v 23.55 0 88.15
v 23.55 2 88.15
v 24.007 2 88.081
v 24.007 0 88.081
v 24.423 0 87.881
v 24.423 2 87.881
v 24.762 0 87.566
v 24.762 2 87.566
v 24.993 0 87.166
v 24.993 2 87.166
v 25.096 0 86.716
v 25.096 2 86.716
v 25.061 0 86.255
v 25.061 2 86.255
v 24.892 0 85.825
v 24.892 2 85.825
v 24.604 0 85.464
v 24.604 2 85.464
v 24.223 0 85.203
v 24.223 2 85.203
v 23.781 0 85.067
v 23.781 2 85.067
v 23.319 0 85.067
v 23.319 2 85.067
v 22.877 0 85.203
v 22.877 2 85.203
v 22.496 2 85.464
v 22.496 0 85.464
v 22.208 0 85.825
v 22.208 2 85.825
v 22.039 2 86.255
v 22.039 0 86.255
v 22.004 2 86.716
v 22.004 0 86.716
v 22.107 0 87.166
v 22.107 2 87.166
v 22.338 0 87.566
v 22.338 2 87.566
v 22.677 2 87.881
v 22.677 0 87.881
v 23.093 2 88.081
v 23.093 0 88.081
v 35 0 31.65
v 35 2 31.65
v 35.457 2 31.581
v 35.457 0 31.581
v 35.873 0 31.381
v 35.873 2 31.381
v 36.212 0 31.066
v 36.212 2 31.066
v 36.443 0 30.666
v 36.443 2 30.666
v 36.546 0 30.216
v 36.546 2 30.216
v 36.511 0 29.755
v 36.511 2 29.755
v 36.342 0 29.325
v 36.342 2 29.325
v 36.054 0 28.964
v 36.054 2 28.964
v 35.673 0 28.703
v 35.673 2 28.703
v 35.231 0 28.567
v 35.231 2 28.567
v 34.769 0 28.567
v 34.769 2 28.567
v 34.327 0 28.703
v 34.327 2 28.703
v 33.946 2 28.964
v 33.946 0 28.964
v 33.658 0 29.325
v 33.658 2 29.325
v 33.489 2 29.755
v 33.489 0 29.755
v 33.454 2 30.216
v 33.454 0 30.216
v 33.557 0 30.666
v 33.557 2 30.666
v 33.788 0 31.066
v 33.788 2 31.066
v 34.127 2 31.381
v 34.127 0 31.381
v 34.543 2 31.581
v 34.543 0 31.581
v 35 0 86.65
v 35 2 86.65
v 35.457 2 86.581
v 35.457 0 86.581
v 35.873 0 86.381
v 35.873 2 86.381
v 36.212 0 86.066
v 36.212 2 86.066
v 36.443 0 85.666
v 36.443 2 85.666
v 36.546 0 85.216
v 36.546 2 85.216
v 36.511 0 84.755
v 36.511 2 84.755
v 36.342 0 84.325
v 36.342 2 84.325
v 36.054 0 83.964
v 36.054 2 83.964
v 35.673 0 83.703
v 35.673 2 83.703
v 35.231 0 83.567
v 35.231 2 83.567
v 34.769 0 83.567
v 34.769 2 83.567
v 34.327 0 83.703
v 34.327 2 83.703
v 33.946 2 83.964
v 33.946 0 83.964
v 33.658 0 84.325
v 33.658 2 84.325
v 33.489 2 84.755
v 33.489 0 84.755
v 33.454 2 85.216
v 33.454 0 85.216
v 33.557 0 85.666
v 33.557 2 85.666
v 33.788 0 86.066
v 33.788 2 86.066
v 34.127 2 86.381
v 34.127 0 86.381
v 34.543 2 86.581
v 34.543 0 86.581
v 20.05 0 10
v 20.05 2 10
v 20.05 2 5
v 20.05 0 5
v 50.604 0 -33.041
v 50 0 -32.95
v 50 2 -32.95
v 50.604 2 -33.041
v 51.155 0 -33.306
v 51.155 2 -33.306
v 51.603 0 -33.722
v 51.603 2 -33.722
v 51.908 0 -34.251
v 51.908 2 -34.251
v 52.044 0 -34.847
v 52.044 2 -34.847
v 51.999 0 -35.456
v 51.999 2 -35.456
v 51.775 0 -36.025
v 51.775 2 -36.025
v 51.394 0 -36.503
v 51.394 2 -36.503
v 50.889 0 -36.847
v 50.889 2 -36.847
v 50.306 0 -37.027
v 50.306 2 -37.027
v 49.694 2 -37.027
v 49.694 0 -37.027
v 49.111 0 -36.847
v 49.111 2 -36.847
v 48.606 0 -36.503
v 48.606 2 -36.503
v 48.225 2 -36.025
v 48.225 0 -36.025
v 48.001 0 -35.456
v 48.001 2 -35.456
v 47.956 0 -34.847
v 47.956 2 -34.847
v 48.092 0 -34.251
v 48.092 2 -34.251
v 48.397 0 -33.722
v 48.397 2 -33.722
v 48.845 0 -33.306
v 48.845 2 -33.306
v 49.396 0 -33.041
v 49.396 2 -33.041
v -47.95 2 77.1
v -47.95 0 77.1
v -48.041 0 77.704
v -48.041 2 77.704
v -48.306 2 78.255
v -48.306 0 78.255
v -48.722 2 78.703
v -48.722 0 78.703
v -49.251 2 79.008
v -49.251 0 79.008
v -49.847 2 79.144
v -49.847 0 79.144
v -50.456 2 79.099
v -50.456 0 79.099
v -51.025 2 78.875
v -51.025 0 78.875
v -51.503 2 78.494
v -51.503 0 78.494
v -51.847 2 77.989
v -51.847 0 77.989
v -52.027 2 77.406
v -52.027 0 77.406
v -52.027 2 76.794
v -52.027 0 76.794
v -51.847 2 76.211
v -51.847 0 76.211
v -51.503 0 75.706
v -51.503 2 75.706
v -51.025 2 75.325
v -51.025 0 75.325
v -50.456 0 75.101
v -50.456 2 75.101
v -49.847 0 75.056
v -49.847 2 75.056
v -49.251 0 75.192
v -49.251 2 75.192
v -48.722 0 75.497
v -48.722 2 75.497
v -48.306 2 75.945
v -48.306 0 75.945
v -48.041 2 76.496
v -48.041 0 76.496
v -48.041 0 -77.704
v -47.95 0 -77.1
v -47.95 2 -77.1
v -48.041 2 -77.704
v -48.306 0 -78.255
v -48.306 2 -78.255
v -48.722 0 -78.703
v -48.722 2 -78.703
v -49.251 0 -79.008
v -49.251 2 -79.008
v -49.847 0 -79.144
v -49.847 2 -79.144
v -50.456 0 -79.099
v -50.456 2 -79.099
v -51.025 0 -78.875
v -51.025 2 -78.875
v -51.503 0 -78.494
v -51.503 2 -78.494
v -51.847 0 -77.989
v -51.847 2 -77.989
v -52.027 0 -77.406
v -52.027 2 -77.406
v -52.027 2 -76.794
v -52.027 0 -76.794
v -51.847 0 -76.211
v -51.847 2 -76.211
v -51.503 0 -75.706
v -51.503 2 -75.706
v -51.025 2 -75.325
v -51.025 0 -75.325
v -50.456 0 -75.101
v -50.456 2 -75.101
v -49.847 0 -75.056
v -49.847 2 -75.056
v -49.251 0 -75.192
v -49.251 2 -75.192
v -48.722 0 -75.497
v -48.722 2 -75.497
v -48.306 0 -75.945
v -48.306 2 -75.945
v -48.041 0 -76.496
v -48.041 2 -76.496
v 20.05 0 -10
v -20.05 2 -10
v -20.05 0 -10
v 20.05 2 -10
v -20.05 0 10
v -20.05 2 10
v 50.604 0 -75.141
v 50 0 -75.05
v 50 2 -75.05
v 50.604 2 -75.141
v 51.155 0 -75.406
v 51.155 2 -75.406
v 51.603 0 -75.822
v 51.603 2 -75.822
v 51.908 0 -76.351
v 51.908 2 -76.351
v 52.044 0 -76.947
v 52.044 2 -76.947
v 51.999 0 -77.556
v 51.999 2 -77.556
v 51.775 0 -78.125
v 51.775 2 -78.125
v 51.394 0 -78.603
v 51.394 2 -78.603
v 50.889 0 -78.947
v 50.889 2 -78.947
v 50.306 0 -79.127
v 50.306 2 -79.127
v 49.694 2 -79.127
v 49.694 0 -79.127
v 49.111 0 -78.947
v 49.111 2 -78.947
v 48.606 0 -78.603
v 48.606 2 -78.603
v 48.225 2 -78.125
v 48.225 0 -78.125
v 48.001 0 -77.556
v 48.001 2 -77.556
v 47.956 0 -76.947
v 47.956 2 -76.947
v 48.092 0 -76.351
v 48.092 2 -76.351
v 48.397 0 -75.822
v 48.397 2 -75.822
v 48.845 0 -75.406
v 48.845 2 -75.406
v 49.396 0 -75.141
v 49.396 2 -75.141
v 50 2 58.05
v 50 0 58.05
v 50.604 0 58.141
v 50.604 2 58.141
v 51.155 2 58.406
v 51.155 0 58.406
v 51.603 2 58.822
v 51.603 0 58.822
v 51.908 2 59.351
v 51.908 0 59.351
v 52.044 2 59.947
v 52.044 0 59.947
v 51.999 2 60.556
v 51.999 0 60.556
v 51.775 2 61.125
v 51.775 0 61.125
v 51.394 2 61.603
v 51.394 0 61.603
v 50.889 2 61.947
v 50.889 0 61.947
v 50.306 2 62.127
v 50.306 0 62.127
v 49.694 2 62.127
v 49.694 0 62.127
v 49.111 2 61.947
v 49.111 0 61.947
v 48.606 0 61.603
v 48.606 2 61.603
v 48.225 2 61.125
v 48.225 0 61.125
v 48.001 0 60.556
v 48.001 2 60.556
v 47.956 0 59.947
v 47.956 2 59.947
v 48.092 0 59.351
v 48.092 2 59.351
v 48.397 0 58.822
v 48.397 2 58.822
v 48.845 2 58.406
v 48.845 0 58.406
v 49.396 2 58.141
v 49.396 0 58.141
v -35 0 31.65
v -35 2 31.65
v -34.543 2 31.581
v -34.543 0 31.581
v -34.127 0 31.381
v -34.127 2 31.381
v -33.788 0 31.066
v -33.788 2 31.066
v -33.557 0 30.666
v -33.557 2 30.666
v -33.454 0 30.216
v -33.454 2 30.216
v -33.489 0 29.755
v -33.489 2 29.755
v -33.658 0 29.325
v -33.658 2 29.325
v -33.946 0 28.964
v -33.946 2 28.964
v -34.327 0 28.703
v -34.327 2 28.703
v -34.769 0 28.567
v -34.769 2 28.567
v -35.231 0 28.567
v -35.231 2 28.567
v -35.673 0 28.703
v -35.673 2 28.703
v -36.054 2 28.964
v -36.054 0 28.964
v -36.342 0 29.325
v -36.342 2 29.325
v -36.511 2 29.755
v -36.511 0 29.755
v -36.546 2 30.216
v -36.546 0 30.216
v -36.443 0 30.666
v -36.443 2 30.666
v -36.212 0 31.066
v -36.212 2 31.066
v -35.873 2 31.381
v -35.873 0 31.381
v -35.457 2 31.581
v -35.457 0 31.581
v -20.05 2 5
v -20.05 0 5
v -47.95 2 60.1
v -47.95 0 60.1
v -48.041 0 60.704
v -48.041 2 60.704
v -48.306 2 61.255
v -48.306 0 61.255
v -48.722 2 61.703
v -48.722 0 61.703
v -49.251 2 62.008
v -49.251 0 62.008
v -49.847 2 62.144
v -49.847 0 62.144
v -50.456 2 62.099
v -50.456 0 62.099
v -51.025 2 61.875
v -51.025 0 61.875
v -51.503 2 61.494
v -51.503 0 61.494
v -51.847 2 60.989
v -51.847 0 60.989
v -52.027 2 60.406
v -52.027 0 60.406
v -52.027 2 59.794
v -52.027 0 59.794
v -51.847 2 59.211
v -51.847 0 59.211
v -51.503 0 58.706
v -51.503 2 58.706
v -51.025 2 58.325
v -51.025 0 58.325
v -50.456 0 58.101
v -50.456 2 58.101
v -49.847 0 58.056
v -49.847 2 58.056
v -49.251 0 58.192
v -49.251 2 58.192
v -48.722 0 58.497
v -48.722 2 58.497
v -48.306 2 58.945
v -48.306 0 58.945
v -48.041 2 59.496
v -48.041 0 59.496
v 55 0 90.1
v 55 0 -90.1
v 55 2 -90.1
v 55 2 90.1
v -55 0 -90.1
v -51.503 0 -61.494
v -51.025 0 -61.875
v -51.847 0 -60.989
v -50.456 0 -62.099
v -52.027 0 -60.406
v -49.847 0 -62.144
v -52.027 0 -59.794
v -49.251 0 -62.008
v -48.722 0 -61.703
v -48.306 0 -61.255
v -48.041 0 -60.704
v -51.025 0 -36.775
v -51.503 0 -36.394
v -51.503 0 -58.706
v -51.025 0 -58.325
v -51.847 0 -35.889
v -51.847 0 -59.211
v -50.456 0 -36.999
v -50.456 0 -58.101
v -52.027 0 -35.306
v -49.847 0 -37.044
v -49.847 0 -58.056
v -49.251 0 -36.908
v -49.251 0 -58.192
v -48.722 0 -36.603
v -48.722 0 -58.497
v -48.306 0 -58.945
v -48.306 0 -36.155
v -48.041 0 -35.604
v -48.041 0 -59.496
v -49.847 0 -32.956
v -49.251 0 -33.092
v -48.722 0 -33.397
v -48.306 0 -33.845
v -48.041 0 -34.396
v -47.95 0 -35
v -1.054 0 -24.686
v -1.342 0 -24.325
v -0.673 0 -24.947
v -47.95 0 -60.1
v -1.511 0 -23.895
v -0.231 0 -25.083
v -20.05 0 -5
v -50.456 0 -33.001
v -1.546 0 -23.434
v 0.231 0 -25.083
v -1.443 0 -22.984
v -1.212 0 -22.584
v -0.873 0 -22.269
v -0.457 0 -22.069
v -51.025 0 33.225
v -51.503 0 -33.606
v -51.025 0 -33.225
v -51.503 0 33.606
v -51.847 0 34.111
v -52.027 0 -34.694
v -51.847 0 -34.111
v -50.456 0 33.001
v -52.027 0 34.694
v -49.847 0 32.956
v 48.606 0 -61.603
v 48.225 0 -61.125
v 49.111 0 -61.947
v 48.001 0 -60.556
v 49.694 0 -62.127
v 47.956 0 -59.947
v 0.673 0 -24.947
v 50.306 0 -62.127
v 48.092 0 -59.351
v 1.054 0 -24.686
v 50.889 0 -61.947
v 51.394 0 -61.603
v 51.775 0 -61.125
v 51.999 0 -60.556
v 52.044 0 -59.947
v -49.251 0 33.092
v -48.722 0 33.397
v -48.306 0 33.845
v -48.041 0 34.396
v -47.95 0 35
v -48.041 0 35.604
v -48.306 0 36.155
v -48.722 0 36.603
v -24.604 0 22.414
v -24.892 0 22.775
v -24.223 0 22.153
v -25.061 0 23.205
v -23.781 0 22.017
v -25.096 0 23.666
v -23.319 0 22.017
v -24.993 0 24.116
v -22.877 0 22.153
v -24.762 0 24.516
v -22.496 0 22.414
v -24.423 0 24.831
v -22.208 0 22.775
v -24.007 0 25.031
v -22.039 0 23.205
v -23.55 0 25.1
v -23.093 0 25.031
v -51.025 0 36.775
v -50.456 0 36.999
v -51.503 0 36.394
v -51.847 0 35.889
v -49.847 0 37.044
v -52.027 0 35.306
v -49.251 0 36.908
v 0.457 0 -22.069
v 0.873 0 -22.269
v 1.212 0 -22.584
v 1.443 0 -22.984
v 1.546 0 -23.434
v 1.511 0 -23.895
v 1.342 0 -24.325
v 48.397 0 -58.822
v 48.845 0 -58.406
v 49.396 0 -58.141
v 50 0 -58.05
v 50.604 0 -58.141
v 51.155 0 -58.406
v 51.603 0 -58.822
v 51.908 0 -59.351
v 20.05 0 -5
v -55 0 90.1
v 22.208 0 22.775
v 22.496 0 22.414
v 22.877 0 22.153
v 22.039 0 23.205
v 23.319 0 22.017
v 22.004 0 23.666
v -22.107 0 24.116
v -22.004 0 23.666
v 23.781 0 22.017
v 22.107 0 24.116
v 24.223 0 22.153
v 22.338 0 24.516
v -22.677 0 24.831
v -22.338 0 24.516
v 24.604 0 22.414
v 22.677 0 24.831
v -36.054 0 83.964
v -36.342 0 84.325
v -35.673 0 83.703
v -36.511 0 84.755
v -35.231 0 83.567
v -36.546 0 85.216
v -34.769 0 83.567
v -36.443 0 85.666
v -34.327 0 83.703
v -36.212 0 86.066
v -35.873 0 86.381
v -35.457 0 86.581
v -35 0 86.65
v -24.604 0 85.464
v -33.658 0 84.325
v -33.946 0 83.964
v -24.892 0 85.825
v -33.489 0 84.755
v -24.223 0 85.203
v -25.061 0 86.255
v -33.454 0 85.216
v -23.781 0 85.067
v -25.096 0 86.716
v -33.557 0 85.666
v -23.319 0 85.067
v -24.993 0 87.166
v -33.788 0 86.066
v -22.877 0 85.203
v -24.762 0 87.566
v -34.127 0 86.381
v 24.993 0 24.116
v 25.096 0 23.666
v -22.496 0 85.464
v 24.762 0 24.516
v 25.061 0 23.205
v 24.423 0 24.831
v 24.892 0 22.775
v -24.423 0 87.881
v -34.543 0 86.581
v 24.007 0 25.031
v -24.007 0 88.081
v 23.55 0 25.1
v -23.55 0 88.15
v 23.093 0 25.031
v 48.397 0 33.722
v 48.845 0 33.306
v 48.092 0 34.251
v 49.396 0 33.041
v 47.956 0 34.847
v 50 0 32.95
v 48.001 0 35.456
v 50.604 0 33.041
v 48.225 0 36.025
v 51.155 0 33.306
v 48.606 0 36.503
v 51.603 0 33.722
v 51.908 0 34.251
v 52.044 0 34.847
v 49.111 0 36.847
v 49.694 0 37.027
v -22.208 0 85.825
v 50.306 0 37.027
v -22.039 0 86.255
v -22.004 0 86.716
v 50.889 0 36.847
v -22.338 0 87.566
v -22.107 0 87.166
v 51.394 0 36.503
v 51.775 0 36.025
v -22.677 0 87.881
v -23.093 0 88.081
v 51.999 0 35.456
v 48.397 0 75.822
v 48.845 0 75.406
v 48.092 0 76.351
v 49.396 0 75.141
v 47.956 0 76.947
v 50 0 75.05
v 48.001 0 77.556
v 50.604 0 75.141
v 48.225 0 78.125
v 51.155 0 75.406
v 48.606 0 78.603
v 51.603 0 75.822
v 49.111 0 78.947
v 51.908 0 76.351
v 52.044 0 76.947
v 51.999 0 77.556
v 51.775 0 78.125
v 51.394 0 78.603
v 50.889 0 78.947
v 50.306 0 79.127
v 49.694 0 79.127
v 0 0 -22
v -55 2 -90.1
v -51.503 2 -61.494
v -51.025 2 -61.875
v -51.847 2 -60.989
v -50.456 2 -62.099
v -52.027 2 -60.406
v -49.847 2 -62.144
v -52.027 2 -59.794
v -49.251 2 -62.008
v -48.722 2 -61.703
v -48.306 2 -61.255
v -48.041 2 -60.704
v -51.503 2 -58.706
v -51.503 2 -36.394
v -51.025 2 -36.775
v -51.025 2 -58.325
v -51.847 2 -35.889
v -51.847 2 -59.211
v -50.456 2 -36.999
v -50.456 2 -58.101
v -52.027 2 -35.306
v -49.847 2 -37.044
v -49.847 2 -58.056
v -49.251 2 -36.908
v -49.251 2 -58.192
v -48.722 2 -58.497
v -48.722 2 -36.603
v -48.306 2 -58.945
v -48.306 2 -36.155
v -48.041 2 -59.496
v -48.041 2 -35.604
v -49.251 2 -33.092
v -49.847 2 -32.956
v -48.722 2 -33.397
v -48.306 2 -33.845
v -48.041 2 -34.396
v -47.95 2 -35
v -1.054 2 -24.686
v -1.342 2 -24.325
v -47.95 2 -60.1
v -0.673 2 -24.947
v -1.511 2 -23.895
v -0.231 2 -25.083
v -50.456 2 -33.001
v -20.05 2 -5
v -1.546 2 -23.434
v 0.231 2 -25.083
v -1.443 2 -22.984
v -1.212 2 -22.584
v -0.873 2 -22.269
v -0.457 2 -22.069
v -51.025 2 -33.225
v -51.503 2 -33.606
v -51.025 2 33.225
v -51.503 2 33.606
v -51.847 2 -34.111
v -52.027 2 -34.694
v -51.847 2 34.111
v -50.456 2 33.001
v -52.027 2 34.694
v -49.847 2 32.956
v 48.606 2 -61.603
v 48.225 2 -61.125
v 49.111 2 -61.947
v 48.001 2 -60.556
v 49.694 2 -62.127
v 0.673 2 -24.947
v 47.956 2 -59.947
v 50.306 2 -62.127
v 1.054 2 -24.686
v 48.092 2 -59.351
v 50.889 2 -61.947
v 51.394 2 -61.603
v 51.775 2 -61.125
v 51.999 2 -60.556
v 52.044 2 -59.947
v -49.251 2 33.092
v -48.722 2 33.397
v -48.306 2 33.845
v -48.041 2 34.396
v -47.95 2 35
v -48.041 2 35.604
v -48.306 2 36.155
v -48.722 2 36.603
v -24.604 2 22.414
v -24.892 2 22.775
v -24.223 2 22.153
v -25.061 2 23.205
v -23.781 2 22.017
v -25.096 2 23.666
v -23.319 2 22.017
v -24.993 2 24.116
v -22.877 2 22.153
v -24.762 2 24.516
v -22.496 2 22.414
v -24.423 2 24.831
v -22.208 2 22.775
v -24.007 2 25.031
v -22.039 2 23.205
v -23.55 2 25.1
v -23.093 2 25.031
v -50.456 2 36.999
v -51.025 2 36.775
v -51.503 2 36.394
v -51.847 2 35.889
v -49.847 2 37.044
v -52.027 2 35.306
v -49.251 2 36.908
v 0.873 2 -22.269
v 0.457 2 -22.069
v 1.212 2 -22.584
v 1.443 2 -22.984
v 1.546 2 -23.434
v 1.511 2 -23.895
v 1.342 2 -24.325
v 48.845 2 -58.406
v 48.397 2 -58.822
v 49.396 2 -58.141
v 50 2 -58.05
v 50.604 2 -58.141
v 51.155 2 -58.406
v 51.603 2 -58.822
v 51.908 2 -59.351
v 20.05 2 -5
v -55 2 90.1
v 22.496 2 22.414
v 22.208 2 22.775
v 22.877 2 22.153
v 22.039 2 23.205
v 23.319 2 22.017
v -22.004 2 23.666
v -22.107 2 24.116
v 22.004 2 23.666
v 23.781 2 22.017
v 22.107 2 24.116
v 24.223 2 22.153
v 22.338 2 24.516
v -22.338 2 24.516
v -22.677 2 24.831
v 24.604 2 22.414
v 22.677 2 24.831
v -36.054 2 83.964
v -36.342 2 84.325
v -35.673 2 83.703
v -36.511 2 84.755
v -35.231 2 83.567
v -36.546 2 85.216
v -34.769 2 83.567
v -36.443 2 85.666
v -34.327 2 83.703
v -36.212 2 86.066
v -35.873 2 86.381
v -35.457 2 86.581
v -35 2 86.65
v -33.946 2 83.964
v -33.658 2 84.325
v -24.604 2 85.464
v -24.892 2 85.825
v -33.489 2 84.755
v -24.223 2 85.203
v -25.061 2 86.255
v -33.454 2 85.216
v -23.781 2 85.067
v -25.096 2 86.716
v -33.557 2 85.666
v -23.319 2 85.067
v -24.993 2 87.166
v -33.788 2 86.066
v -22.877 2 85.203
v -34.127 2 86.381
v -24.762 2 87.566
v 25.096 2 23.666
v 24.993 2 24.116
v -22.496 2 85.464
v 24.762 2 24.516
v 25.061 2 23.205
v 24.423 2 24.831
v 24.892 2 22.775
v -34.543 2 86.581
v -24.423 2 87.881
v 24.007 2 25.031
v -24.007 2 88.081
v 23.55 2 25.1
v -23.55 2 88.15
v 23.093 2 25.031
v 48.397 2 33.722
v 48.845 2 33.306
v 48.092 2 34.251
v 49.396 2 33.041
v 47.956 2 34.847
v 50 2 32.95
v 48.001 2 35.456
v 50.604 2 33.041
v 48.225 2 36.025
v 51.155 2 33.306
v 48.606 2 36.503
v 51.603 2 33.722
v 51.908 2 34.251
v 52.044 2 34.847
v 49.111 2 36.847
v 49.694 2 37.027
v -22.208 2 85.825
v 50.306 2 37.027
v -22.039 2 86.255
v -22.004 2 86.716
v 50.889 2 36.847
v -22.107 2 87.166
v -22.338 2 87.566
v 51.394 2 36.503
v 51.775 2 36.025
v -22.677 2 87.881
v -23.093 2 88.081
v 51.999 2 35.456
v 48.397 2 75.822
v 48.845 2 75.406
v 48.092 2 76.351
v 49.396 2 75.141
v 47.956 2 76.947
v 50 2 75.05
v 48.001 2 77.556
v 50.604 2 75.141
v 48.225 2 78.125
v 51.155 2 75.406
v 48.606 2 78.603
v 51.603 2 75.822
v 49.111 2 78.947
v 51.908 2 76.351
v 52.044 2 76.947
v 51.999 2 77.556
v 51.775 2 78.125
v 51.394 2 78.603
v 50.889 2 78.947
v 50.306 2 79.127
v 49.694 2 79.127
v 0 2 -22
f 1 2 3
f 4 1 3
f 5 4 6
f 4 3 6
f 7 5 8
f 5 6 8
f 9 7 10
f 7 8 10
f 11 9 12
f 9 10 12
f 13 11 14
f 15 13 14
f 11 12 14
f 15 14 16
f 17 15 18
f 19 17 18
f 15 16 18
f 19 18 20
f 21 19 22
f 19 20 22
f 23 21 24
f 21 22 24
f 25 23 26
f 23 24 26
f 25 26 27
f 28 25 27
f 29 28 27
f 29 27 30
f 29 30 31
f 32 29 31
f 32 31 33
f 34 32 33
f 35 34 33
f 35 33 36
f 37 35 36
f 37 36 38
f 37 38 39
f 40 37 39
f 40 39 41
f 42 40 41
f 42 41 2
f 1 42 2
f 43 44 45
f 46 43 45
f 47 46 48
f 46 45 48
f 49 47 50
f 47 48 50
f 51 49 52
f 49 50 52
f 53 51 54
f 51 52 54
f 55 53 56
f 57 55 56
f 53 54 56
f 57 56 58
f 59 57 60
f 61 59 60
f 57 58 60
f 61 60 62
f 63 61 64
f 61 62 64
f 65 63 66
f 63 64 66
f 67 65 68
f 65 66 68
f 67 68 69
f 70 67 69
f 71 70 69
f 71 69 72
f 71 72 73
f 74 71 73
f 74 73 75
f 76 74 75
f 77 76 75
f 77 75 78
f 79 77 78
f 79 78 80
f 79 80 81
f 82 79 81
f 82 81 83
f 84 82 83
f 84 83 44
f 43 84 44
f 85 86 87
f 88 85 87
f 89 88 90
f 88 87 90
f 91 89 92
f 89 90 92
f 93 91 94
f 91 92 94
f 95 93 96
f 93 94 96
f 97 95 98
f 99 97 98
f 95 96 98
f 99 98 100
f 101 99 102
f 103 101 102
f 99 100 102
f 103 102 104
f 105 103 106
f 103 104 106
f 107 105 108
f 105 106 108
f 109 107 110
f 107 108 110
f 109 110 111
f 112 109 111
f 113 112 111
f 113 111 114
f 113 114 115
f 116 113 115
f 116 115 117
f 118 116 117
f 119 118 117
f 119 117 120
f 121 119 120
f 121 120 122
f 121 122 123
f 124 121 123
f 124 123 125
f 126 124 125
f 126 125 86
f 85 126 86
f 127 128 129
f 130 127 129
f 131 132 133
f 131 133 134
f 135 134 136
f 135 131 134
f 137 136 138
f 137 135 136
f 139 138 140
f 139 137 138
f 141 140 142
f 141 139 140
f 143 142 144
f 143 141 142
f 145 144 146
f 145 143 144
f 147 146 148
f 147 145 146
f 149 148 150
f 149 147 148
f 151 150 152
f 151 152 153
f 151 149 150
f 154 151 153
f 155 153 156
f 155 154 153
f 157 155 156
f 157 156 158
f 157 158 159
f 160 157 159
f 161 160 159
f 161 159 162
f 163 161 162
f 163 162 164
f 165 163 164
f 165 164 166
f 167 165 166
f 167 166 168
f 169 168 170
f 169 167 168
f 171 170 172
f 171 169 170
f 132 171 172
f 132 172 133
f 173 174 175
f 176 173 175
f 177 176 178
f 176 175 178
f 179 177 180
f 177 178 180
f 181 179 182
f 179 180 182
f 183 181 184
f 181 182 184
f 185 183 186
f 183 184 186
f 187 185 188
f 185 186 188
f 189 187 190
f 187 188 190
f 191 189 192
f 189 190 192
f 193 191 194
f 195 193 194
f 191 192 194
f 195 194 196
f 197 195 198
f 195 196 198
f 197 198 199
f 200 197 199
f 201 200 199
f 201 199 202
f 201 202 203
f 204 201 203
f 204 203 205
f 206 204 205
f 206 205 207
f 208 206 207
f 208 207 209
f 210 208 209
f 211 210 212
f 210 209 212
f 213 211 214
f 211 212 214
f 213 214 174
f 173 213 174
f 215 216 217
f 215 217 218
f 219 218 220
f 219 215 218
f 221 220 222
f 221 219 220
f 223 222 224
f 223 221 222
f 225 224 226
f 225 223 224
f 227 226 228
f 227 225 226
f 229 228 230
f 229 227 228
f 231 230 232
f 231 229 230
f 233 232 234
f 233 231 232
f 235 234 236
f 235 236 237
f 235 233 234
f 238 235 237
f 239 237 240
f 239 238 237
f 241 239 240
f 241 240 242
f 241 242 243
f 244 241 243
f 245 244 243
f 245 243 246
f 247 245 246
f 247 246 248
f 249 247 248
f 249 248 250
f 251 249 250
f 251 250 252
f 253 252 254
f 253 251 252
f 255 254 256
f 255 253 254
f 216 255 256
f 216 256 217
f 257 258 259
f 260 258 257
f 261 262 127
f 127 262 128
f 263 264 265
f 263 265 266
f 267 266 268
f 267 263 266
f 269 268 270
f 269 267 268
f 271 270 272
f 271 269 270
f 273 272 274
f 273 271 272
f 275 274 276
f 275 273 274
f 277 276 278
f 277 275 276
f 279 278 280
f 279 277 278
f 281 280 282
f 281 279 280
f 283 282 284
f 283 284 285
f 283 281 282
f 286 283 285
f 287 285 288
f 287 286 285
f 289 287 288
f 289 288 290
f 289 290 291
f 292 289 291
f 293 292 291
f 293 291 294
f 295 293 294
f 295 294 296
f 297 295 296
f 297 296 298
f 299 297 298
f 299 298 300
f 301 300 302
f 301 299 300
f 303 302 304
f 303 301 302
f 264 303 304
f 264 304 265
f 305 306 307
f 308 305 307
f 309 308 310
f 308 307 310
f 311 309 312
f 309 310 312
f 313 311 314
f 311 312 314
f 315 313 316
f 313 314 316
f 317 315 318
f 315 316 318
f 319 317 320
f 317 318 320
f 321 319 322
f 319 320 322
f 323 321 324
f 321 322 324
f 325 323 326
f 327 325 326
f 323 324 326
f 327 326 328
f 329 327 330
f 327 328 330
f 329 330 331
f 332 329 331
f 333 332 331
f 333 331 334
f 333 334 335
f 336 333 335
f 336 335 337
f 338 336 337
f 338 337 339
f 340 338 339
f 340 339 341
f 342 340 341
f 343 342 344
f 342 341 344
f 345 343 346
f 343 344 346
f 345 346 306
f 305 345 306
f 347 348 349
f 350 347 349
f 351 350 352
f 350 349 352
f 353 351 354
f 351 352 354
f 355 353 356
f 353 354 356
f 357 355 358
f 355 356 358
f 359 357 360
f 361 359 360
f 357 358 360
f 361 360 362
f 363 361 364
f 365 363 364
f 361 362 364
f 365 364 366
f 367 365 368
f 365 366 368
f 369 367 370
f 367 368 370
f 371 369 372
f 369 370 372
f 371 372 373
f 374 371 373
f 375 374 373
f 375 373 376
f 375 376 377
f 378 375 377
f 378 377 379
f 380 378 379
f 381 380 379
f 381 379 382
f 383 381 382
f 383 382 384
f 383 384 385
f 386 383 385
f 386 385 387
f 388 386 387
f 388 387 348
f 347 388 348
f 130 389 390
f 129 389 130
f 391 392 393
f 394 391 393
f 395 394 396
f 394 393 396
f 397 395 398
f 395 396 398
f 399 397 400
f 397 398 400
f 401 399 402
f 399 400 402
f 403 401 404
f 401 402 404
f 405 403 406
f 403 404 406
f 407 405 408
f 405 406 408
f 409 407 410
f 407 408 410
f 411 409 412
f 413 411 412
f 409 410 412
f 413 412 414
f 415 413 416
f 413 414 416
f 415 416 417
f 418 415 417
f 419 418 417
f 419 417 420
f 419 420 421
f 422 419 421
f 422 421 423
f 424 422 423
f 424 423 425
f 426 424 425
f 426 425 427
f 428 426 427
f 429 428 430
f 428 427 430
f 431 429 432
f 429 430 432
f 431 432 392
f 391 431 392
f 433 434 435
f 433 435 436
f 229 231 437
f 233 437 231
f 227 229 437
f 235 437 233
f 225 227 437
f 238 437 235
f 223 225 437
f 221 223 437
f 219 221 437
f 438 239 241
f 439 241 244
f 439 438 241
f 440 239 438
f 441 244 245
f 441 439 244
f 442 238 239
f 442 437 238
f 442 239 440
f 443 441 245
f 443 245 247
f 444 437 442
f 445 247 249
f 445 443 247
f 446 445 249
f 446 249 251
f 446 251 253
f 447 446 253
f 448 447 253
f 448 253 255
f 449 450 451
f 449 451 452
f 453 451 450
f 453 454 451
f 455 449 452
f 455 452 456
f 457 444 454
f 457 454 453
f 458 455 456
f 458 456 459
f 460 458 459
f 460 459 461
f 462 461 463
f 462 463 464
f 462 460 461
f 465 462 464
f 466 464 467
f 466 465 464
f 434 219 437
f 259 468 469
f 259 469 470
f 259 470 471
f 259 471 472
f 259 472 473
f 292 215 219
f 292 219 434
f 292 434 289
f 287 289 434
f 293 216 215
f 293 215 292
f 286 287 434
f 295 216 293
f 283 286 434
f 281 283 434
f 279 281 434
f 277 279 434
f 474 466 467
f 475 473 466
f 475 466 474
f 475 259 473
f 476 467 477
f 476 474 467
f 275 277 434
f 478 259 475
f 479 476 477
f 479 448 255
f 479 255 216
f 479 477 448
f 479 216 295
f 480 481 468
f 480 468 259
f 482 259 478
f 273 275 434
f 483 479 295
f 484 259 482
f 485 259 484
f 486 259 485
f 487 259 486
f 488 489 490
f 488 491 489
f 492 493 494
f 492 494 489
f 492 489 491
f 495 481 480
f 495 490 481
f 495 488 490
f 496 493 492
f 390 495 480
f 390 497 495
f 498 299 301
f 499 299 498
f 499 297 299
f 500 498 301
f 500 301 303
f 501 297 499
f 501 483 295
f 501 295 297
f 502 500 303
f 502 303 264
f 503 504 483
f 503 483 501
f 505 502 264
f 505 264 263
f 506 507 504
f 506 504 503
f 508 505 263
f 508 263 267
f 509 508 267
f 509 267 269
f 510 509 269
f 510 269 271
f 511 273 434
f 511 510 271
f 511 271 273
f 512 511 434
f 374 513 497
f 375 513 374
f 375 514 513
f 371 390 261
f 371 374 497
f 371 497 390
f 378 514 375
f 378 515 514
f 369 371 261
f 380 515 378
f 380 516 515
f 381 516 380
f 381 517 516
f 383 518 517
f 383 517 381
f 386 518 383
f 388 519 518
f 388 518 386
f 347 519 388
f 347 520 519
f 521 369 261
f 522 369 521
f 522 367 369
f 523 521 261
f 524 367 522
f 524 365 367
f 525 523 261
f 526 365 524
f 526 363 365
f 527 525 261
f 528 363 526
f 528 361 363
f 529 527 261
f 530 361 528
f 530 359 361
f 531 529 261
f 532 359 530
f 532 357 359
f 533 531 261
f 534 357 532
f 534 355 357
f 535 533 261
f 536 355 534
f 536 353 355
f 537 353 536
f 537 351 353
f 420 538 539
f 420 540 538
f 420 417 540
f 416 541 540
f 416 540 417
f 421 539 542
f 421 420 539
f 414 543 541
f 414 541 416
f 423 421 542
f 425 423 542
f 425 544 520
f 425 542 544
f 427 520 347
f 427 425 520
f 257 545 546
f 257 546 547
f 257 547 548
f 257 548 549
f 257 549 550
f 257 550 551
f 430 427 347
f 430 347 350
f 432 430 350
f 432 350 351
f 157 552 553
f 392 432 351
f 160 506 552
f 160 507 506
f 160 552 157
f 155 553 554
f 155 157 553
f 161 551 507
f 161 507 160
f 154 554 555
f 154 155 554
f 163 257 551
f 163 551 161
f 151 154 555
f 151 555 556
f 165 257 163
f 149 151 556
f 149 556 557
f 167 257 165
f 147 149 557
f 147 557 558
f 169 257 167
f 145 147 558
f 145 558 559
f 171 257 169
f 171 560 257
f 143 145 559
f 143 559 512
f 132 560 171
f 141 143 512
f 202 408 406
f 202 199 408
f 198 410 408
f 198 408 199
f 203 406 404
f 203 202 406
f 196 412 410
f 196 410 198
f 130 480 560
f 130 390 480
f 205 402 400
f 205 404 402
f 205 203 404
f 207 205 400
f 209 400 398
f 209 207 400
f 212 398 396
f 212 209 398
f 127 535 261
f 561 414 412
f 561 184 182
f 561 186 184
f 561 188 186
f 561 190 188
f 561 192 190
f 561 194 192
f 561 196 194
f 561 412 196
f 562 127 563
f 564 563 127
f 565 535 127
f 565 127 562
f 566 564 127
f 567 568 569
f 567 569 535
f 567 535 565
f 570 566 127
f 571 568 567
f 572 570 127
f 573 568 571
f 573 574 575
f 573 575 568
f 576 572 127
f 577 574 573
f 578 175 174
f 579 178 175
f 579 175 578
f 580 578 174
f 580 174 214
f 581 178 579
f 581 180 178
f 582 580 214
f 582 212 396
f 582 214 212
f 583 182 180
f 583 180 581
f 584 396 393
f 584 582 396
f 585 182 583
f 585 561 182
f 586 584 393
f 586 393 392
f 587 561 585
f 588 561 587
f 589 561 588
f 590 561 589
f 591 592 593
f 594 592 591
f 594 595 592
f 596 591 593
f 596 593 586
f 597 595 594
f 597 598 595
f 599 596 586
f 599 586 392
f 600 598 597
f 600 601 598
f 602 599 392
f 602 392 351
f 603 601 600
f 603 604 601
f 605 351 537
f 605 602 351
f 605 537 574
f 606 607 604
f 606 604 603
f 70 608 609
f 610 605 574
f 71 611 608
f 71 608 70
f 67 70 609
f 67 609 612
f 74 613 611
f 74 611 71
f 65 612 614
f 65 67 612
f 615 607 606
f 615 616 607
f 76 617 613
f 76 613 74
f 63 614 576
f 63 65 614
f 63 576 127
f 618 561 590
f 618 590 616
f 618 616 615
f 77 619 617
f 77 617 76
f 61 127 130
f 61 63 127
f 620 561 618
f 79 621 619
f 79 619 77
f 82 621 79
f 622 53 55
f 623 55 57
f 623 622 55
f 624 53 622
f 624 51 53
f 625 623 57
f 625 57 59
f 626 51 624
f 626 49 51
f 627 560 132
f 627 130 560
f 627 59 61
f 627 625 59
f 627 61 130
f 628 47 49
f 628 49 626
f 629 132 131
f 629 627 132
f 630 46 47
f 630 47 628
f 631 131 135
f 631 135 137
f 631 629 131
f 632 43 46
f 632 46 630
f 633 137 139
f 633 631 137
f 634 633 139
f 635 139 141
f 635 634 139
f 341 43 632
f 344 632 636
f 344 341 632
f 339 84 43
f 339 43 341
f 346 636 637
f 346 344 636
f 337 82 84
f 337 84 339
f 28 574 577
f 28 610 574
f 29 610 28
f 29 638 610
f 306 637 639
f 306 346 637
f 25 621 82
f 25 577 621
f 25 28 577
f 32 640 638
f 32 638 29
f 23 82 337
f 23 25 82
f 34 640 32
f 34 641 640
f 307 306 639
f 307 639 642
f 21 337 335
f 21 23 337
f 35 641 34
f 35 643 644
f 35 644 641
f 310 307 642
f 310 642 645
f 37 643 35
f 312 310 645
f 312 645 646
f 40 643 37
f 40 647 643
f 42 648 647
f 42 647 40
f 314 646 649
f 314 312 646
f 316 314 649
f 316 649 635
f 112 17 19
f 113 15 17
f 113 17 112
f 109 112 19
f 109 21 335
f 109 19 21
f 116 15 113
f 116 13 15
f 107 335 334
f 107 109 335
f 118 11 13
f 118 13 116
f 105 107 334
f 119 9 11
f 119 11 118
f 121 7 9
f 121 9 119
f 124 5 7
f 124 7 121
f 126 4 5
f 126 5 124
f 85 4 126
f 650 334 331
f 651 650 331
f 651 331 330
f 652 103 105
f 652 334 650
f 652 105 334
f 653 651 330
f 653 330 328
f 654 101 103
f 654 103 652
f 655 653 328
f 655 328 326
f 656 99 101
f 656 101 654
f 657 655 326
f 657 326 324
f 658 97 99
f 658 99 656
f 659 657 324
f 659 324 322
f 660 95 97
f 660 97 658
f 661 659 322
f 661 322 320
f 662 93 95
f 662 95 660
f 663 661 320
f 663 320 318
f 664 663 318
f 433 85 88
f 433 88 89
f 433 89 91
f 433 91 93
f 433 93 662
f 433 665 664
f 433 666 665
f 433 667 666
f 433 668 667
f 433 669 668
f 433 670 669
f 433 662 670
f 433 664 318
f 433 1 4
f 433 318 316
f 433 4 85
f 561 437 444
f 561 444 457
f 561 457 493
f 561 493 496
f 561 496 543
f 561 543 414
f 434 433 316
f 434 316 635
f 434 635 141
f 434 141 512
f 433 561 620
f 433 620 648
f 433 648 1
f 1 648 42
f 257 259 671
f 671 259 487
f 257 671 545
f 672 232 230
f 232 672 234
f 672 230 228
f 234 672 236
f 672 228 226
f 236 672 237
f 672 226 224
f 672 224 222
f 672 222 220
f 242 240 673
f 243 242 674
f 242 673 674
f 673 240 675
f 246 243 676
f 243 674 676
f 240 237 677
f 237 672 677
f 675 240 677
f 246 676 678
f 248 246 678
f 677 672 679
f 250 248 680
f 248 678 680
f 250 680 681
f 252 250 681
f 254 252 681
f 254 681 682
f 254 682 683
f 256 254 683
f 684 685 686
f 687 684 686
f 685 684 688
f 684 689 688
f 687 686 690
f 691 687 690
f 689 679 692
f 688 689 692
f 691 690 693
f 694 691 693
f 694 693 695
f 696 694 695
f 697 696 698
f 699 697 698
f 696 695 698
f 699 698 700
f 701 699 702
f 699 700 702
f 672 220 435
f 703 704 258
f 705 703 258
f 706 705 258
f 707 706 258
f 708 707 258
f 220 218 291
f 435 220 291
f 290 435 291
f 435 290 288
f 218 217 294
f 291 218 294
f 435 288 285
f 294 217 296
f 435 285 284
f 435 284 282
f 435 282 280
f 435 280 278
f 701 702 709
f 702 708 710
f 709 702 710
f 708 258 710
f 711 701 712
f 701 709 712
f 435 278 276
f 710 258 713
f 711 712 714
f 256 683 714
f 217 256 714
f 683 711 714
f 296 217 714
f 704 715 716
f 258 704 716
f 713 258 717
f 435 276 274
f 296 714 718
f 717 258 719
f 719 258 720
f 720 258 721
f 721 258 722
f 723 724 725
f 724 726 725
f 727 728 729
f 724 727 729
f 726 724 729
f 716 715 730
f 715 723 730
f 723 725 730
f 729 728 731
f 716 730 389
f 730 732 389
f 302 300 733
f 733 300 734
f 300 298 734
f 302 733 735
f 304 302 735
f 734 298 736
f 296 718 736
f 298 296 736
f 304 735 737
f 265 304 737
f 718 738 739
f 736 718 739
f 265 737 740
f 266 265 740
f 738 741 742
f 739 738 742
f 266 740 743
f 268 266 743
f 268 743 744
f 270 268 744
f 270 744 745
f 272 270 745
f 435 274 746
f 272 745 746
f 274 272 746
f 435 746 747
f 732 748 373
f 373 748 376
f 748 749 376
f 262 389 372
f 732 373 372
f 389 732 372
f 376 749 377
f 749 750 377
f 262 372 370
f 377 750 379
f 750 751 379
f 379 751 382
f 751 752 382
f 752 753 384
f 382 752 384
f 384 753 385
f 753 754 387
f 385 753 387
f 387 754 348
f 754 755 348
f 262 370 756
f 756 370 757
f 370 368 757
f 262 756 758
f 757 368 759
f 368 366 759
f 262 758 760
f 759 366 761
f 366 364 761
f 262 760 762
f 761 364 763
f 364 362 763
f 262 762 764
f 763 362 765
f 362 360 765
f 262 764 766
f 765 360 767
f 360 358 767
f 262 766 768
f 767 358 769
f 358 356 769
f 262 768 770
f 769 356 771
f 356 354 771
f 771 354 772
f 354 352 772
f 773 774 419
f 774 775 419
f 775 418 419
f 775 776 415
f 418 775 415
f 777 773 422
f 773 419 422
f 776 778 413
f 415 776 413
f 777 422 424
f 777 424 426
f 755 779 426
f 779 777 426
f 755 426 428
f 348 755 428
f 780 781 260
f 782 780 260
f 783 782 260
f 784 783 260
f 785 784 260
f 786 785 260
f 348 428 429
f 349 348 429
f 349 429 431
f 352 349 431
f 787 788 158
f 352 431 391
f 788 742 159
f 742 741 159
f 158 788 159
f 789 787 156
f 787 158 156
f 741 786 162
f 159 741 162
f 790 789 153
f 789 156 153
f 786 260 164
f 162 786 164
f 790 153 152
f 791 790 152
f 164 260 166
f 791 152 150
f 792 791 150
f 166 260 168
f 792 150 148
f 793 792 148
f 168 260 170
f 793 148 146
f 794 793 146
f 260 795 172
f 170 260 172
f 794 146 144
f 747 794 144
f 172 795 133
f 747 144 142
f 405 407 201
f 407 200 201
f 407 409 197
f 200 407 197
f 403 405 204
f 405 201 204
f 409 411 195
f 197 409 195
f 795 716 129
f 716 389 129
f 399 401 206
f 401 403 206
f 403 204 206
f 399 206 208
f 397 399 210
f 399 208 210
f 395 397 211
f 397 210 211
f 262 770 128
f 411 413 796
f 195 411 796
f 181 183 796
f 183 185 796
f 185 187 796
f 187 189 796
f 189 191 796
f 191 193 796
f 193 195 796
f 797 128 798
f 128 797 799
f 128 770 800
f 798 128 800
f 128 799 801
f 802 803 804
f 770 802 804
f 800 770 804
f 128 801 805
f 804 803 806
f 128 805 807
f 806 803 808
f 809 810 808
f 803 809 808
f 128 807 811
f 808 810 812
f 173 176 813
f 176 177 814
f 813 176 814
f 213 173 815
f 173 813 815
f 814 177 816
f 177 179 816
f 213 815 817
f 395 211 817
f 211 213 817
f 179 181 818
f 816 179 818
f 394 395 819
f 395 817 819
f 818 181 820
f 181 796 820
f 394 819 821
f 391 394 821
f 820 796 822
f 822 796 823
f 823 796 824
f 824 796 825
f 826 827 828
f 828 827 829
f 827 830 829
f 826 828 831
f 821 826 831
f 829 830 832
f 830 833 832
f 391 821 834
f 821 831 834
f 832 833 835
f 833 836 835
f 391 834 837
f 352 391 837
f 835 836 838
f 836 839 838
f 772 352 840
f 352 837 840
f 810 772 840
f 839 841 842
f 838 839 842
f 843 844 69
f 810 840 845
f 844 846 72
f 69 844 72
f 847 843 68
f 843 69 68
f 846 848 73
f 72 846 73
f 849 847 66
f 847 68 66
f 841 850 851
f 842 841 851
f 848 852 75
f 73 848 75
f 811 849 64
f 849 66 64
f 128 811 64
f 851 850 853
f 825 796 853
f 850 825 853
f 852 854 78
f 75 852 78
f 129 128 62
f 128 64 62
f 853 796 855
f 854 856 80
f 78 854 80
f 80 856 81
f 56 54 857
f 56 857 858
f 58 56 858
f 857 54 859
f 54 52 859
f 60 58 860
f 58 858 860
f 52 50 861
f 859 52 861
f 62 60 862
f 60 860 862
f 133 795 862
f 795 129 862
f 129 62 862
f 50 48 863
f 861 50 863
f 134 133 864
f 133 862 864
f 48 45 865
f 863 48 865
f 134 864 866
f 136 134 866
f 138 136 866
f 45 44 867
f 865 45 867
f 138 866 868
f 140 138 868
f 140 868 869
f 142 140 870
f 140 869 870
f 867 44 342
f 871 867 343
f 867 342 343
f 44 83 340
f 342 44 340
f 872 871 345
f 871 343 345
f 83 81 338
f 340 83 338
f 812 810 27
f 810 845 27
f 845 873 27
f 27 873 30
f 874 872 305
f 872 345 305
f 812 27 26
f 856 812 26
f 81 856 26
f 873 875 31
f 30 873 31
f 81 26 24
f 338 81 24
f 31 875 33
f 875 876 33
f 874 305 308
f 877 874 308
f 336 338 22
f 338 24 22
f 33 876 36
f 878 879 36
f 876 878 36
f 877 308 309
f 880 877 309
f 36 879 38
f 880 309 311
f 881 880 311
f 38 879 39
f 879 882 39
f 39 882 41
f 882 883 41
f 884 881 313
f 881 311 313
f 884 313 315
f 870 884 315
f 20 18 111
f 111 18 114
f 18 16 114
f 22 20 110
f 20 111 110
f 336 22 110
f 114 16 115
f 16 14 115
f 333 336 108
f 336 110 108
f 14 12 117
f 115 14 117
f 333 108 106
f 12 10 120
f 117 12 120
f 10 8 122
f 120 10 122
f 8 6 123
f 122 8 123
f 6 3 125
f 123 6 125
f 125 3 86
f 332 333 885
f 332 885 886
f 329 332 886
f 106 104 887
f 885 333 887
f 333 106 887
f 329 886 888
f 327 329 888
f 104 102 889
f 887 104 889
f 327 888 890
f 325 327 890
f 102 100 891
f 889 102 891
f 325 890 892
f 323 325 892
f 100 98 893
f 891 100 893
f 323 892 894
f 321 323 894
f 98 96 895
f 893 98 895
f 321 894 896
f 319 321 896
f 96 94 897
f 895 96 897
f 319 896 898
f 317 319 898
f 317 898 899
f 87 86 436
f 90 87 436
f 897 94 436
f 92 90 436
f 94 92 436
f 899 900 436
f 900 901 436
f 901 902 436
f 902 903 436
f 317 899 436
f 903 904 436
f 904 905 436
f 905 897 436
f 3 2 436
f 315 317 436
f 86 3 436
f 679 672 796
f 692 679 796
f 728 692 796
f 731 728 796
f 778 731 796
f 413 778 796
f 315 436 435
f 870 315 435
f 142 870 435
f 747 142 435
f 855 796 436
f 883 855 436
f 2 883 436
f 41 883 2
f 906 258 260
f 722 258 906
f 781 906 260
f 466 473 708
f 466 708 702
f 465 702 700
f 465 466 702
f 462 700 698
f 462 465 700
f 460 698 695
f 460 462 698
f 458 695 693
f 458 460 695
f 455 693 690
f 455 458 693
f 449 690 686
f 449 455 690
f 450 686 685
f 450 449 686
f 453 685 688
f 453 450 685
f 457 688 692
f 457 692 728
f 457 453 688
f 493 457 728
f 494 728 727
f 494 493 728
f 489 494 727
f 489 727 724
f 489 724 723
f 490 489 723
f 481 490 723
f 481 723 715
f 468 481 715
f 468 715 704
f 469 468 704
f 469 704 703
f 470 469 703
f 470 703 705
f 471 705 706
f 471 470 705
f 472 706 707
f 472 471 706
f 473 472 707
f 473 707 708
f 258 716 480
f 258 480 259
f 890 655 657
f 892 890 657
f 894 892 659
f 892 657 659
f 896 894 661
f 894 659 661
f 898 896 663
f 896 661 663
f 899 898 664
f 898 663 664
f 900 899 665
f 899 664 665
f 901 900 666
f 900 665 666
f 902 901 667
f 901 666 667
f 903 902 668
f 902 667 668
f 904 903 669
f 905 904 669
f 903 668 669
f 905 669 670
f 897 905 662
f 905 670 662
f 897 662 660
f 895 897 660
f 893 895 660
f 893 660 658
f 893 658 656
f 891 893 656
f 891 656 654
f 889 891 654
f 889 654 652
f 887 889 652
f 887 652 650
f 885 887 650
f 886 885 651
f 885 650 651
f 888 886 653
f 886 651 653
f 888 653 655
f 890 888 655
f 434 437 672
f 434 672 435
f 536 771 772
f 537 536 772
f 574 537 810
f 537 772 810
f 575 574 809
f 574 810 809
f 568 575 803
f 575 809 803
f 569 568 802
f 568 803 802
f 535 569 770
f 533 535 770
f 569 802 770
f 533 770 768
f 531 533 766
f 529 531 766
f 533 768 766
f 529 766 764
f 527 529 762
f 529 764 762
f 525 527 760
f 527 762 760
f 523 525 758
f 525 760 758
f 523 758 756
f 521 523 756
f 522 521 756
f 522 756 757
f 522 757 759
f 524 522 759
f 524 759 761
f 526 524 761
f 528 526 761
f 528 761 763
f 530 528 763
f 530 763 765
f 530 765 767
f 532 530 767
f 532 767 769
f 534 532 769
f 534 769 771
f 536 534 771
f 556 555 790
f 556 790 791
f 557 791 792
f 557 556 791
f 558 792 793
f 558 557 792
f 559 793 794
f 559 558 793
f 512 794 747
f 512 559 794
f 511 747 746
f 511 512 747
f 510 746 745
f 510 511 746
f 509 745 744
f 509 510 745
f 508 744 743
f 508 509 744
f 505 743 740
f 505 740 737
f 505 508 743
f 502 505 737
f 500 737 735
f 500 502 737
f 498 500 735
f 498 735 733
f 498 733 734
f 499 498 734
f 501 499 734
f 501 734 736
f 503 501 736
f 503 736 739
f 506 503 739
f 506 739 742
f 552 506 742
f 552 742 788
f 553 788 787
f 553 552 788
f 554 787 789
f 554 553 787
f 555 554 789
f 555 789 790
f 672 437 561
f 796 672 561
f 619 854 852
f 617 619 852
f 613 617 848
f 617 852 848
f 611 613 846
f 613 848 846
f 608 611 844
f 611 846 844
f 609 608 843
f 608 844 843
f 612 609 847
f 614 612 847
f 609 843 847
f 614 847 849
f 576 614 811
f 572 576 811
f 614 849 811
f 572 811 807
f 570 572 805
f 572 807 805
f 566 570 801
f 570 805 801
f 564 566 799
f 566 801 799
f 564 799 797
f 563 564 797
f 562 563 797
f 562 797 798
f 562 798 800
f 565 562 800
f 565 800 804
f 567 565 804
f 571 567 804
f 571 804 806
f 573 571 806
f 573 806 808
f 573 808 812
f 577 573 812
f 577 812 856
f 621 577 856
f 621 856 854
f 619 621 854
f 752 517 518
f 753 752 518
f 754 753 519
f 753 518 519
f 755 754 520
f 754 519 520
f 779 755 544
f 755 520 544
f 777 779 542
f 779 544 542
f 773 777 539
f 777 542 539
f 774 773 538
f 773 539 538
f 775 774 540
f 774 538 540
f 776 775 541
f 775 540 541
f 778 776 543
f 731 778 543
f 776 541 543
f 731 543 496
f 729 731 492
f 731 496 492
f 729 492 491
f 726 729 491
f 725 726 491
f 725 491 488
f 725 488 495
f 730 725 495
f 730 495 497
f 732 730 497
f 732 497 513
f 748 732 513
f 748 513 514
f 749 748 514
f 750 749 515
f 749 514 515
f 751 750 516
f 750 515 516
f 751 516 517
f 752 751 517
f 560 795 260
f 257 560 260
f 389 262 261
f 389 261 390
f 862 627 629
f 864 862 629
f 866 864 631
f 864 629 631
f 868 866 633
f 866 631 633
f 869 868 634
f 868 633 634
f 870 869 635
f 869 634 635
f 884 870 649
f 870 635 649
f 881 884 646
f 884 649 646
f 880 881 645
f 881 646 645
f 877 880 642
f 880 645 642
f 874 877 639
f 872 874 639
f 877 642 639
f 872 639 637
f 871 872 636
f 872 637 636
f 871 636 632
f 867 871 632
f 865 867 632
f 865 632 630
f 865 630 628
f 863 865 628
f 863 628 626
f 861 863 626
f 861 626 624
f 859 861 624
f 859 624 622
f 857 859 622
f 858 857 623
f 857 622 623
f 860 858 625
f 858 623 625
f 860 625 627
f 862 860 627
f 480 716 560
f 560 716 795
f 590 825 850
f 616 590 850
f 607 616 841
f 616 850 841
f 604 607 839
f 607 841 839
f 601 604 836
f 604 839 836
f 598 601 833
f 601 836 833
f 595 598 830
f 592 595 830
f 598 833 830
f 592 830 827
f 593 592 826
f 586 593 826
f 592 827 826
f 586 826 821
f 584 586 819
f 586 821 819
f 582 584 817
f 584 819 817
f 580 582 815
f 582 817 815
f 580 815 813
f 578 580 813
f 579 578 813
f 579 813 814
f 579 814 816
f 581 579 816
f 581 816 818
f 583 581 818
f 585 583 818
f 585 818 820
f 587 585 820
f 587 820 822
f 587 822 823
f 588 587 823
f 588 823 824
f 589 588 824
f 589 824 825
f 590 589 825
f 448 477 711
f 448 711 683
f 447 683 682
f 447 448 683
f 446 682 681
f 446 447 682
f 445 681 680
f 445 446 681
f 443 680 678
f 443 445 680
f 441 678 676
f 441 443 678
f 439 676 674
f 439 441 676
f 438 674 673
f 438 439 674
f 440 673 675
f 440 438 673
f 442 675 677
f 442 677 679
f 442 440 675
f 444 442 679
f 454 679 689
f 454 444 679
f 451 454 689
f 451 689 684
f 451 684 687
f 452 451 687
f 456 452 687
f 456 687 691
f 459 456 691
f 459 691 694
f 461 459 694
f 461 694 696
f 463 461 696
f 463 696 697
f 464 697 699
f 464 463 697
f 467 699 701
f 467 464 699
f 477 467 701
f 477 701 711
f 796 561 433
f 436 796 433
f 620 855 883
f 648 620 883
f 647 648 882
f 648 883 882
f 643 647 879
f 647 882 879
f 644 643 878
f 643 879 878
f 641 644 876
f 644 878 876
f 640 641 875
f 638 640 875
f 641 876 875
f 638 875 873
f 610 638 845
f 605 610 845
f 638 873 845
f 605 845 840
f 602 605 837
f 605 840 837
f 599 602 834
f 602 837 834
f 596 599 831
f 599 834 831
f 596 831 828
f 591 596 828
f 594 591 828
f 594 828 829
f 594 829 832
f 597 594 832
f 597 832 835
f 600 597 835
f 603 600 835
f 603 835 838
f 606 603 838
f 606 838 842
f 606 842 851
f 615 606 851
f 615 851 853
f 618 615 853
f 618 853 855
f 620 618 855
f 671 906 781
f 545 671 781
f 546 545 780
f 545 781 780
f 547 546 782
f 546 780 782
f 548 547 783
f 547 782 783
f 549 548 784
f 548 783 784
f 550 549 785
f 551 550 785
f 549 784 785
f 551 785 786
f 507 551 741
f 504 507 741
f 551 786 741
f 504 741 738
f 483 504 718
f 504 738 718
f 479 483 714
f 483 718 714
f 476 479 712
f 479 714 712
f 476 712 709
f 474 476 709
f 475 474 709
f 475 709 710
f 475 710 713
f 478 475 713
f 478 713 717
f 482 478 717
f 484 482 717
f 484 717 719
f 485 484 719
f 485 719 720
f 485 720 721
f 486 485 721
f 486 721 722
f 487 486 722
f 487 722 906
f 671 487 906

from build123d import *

# Parameters (mm, degrees)
SKETCH1_W           = 55
SKETCH1_H           = 90.1
SKETCH1_R           = 2.05
BOSS_EXTRUDE2_DEPTH = 2
MIRROR1_OUTLINE_W   = 55
MIRROR1_OUTLINE_H   = 90.1
MIRROR1_OUTLINE_R   = 2.05
MIRROR1_DEPTH       = 2
SKETCH2_W           = 40.1
SKETCH2_H           = 5
CUT_EXTRUDE1_DEPTH  = 10
SKETCH3_R           = 1.55
CUT_EXTRUDE2_DEPTH  = 10


# Read off the part's stored shape, not the designer's step: Mirror1
with BuildPart() as part:
    # Sketch1 → Boss-Extrude2 (new body)
    with BuildSketch(Plane(origin=(0, 0, 0), x_dir=(1, 0, 0), z_dir=(0, 1, 0))):
        with Locations((27.5, 45.05)):
            Rectangle(SKETCH1_W, SKETCH1_H)
        with Locations(Location((50, 77.1, 0), (0, 0, 270))):
            Circle(SKETCH1_R, mode=Mode.SUBTRACT)
        with Locations(Location((50, 60.1, 0), (0, 0, 270))):
            Circle(SKETCH1_R, mode=Mode.SUBTRACT)
        with Locations(Location((50, 35, 0), (0, 0, 270))):
            Circle(SKETCH1_R, mode=Mode.SUBTRACT)
    extrude(amount=BOSS_EXTRUDE2_DEPTH)

    # Mirror1 outline → Mirror1 (add)
    with BuildSketch(Plane(origin=(0, 0, 0), x_dir=(1, 0, 0), z_dir=(0, 1, 0))):
        with Locations((-27.5, 45.05)):
            Rectangle(MIRROR1_OUTLINE_W, MIRROR1_OUTLINE_H)
        with Locations((-50, 35)):
            Circle(MIRROR1_OUTLINE_R, mode=Mode.SUBTRACT)
        with Locations((-50, 60.1)):
            Circle(MIRROR1_OUTLINE_R, mode=Mode.SUBTRACT)
        with Locations((-50, 77.1)):
            Circle(MIRROR1_OUTLINE_R, mode=Mode.SUBTRACT)
    extrude(amount=MIRROR1_DEPTH)

    # Mirror2: part across plane


with BuildPart() as part_1:
    add(part.part)
    add(part.part.mirror(Plane(origin=(0, 2, 0), x_dir=(1, 0, 0), z_dir=(0, 0, -1))))

    # Sketch2 → Cut-Extrude1 (cut)
    with BuildSketch(Plane(origin=(0, 2, 0), x_dir=(1, 0, 0), z_dir=(0, 1, 0))):
        with Locations((0, 7.5)):
            Rectangle(SKETCH2_W, SKETCH2_H)
        with Locations((0, -7.5)):
            Rectangle(SKETCH2_W, SKETCH2_H)
    extrude(amount=-CUT_EXTRUDE1_DEPTH, mode=Mode.SUBTRACT)

    # Sketch3 → Cut-Extrude2 (cut)
    with BuildSketch(Plane(origin=(0, 2, 0), x_dir=(1, 0, 0), z_dir=(0, 1, 0))):
        with Locations(Location((-35, -30.1, 0), (0, 0, 270))):
            Circle(SKETCH3_R)
        with Locations(Location((-35, -85.1, 0), (0, 0, 270))):
            Circle(SKETCH3_R)
        with Locations(Location((35, -30.1, 0), (0, 0, 270))):
            Circle(SKETCH3_R)
        with Locations(Location((35, -85.1, 0), (0, 0, 270))):
            Circle(SKETCH3_R)
        with Locations(Location((0, 23.55, 0), (0, 0, 270))):
            Circle(SKETCH3_R)
        with Locations(Location((23.55, -23.55, 0), (0, 0, 270))):
            Circle(SKETCH3_R)
        with Locations(Location((-23.55, -86.6, 0), (0, 0, 270))):
            Circle(SKETCH3_R)
        with Locations(Location((23.55, -86.6, 0), (0, 0, 270))):
            Circle(SKETCH3_R)
        with Locations(Location((-23.55, -23.55, 0), (0, 0, 270))):
            Circle(SKETCH3_R)
    extrude(amount=-CUT_EXTRUDE2_DEPTH, mode=Mode.SUBTRACT)


solid = part_1.part
